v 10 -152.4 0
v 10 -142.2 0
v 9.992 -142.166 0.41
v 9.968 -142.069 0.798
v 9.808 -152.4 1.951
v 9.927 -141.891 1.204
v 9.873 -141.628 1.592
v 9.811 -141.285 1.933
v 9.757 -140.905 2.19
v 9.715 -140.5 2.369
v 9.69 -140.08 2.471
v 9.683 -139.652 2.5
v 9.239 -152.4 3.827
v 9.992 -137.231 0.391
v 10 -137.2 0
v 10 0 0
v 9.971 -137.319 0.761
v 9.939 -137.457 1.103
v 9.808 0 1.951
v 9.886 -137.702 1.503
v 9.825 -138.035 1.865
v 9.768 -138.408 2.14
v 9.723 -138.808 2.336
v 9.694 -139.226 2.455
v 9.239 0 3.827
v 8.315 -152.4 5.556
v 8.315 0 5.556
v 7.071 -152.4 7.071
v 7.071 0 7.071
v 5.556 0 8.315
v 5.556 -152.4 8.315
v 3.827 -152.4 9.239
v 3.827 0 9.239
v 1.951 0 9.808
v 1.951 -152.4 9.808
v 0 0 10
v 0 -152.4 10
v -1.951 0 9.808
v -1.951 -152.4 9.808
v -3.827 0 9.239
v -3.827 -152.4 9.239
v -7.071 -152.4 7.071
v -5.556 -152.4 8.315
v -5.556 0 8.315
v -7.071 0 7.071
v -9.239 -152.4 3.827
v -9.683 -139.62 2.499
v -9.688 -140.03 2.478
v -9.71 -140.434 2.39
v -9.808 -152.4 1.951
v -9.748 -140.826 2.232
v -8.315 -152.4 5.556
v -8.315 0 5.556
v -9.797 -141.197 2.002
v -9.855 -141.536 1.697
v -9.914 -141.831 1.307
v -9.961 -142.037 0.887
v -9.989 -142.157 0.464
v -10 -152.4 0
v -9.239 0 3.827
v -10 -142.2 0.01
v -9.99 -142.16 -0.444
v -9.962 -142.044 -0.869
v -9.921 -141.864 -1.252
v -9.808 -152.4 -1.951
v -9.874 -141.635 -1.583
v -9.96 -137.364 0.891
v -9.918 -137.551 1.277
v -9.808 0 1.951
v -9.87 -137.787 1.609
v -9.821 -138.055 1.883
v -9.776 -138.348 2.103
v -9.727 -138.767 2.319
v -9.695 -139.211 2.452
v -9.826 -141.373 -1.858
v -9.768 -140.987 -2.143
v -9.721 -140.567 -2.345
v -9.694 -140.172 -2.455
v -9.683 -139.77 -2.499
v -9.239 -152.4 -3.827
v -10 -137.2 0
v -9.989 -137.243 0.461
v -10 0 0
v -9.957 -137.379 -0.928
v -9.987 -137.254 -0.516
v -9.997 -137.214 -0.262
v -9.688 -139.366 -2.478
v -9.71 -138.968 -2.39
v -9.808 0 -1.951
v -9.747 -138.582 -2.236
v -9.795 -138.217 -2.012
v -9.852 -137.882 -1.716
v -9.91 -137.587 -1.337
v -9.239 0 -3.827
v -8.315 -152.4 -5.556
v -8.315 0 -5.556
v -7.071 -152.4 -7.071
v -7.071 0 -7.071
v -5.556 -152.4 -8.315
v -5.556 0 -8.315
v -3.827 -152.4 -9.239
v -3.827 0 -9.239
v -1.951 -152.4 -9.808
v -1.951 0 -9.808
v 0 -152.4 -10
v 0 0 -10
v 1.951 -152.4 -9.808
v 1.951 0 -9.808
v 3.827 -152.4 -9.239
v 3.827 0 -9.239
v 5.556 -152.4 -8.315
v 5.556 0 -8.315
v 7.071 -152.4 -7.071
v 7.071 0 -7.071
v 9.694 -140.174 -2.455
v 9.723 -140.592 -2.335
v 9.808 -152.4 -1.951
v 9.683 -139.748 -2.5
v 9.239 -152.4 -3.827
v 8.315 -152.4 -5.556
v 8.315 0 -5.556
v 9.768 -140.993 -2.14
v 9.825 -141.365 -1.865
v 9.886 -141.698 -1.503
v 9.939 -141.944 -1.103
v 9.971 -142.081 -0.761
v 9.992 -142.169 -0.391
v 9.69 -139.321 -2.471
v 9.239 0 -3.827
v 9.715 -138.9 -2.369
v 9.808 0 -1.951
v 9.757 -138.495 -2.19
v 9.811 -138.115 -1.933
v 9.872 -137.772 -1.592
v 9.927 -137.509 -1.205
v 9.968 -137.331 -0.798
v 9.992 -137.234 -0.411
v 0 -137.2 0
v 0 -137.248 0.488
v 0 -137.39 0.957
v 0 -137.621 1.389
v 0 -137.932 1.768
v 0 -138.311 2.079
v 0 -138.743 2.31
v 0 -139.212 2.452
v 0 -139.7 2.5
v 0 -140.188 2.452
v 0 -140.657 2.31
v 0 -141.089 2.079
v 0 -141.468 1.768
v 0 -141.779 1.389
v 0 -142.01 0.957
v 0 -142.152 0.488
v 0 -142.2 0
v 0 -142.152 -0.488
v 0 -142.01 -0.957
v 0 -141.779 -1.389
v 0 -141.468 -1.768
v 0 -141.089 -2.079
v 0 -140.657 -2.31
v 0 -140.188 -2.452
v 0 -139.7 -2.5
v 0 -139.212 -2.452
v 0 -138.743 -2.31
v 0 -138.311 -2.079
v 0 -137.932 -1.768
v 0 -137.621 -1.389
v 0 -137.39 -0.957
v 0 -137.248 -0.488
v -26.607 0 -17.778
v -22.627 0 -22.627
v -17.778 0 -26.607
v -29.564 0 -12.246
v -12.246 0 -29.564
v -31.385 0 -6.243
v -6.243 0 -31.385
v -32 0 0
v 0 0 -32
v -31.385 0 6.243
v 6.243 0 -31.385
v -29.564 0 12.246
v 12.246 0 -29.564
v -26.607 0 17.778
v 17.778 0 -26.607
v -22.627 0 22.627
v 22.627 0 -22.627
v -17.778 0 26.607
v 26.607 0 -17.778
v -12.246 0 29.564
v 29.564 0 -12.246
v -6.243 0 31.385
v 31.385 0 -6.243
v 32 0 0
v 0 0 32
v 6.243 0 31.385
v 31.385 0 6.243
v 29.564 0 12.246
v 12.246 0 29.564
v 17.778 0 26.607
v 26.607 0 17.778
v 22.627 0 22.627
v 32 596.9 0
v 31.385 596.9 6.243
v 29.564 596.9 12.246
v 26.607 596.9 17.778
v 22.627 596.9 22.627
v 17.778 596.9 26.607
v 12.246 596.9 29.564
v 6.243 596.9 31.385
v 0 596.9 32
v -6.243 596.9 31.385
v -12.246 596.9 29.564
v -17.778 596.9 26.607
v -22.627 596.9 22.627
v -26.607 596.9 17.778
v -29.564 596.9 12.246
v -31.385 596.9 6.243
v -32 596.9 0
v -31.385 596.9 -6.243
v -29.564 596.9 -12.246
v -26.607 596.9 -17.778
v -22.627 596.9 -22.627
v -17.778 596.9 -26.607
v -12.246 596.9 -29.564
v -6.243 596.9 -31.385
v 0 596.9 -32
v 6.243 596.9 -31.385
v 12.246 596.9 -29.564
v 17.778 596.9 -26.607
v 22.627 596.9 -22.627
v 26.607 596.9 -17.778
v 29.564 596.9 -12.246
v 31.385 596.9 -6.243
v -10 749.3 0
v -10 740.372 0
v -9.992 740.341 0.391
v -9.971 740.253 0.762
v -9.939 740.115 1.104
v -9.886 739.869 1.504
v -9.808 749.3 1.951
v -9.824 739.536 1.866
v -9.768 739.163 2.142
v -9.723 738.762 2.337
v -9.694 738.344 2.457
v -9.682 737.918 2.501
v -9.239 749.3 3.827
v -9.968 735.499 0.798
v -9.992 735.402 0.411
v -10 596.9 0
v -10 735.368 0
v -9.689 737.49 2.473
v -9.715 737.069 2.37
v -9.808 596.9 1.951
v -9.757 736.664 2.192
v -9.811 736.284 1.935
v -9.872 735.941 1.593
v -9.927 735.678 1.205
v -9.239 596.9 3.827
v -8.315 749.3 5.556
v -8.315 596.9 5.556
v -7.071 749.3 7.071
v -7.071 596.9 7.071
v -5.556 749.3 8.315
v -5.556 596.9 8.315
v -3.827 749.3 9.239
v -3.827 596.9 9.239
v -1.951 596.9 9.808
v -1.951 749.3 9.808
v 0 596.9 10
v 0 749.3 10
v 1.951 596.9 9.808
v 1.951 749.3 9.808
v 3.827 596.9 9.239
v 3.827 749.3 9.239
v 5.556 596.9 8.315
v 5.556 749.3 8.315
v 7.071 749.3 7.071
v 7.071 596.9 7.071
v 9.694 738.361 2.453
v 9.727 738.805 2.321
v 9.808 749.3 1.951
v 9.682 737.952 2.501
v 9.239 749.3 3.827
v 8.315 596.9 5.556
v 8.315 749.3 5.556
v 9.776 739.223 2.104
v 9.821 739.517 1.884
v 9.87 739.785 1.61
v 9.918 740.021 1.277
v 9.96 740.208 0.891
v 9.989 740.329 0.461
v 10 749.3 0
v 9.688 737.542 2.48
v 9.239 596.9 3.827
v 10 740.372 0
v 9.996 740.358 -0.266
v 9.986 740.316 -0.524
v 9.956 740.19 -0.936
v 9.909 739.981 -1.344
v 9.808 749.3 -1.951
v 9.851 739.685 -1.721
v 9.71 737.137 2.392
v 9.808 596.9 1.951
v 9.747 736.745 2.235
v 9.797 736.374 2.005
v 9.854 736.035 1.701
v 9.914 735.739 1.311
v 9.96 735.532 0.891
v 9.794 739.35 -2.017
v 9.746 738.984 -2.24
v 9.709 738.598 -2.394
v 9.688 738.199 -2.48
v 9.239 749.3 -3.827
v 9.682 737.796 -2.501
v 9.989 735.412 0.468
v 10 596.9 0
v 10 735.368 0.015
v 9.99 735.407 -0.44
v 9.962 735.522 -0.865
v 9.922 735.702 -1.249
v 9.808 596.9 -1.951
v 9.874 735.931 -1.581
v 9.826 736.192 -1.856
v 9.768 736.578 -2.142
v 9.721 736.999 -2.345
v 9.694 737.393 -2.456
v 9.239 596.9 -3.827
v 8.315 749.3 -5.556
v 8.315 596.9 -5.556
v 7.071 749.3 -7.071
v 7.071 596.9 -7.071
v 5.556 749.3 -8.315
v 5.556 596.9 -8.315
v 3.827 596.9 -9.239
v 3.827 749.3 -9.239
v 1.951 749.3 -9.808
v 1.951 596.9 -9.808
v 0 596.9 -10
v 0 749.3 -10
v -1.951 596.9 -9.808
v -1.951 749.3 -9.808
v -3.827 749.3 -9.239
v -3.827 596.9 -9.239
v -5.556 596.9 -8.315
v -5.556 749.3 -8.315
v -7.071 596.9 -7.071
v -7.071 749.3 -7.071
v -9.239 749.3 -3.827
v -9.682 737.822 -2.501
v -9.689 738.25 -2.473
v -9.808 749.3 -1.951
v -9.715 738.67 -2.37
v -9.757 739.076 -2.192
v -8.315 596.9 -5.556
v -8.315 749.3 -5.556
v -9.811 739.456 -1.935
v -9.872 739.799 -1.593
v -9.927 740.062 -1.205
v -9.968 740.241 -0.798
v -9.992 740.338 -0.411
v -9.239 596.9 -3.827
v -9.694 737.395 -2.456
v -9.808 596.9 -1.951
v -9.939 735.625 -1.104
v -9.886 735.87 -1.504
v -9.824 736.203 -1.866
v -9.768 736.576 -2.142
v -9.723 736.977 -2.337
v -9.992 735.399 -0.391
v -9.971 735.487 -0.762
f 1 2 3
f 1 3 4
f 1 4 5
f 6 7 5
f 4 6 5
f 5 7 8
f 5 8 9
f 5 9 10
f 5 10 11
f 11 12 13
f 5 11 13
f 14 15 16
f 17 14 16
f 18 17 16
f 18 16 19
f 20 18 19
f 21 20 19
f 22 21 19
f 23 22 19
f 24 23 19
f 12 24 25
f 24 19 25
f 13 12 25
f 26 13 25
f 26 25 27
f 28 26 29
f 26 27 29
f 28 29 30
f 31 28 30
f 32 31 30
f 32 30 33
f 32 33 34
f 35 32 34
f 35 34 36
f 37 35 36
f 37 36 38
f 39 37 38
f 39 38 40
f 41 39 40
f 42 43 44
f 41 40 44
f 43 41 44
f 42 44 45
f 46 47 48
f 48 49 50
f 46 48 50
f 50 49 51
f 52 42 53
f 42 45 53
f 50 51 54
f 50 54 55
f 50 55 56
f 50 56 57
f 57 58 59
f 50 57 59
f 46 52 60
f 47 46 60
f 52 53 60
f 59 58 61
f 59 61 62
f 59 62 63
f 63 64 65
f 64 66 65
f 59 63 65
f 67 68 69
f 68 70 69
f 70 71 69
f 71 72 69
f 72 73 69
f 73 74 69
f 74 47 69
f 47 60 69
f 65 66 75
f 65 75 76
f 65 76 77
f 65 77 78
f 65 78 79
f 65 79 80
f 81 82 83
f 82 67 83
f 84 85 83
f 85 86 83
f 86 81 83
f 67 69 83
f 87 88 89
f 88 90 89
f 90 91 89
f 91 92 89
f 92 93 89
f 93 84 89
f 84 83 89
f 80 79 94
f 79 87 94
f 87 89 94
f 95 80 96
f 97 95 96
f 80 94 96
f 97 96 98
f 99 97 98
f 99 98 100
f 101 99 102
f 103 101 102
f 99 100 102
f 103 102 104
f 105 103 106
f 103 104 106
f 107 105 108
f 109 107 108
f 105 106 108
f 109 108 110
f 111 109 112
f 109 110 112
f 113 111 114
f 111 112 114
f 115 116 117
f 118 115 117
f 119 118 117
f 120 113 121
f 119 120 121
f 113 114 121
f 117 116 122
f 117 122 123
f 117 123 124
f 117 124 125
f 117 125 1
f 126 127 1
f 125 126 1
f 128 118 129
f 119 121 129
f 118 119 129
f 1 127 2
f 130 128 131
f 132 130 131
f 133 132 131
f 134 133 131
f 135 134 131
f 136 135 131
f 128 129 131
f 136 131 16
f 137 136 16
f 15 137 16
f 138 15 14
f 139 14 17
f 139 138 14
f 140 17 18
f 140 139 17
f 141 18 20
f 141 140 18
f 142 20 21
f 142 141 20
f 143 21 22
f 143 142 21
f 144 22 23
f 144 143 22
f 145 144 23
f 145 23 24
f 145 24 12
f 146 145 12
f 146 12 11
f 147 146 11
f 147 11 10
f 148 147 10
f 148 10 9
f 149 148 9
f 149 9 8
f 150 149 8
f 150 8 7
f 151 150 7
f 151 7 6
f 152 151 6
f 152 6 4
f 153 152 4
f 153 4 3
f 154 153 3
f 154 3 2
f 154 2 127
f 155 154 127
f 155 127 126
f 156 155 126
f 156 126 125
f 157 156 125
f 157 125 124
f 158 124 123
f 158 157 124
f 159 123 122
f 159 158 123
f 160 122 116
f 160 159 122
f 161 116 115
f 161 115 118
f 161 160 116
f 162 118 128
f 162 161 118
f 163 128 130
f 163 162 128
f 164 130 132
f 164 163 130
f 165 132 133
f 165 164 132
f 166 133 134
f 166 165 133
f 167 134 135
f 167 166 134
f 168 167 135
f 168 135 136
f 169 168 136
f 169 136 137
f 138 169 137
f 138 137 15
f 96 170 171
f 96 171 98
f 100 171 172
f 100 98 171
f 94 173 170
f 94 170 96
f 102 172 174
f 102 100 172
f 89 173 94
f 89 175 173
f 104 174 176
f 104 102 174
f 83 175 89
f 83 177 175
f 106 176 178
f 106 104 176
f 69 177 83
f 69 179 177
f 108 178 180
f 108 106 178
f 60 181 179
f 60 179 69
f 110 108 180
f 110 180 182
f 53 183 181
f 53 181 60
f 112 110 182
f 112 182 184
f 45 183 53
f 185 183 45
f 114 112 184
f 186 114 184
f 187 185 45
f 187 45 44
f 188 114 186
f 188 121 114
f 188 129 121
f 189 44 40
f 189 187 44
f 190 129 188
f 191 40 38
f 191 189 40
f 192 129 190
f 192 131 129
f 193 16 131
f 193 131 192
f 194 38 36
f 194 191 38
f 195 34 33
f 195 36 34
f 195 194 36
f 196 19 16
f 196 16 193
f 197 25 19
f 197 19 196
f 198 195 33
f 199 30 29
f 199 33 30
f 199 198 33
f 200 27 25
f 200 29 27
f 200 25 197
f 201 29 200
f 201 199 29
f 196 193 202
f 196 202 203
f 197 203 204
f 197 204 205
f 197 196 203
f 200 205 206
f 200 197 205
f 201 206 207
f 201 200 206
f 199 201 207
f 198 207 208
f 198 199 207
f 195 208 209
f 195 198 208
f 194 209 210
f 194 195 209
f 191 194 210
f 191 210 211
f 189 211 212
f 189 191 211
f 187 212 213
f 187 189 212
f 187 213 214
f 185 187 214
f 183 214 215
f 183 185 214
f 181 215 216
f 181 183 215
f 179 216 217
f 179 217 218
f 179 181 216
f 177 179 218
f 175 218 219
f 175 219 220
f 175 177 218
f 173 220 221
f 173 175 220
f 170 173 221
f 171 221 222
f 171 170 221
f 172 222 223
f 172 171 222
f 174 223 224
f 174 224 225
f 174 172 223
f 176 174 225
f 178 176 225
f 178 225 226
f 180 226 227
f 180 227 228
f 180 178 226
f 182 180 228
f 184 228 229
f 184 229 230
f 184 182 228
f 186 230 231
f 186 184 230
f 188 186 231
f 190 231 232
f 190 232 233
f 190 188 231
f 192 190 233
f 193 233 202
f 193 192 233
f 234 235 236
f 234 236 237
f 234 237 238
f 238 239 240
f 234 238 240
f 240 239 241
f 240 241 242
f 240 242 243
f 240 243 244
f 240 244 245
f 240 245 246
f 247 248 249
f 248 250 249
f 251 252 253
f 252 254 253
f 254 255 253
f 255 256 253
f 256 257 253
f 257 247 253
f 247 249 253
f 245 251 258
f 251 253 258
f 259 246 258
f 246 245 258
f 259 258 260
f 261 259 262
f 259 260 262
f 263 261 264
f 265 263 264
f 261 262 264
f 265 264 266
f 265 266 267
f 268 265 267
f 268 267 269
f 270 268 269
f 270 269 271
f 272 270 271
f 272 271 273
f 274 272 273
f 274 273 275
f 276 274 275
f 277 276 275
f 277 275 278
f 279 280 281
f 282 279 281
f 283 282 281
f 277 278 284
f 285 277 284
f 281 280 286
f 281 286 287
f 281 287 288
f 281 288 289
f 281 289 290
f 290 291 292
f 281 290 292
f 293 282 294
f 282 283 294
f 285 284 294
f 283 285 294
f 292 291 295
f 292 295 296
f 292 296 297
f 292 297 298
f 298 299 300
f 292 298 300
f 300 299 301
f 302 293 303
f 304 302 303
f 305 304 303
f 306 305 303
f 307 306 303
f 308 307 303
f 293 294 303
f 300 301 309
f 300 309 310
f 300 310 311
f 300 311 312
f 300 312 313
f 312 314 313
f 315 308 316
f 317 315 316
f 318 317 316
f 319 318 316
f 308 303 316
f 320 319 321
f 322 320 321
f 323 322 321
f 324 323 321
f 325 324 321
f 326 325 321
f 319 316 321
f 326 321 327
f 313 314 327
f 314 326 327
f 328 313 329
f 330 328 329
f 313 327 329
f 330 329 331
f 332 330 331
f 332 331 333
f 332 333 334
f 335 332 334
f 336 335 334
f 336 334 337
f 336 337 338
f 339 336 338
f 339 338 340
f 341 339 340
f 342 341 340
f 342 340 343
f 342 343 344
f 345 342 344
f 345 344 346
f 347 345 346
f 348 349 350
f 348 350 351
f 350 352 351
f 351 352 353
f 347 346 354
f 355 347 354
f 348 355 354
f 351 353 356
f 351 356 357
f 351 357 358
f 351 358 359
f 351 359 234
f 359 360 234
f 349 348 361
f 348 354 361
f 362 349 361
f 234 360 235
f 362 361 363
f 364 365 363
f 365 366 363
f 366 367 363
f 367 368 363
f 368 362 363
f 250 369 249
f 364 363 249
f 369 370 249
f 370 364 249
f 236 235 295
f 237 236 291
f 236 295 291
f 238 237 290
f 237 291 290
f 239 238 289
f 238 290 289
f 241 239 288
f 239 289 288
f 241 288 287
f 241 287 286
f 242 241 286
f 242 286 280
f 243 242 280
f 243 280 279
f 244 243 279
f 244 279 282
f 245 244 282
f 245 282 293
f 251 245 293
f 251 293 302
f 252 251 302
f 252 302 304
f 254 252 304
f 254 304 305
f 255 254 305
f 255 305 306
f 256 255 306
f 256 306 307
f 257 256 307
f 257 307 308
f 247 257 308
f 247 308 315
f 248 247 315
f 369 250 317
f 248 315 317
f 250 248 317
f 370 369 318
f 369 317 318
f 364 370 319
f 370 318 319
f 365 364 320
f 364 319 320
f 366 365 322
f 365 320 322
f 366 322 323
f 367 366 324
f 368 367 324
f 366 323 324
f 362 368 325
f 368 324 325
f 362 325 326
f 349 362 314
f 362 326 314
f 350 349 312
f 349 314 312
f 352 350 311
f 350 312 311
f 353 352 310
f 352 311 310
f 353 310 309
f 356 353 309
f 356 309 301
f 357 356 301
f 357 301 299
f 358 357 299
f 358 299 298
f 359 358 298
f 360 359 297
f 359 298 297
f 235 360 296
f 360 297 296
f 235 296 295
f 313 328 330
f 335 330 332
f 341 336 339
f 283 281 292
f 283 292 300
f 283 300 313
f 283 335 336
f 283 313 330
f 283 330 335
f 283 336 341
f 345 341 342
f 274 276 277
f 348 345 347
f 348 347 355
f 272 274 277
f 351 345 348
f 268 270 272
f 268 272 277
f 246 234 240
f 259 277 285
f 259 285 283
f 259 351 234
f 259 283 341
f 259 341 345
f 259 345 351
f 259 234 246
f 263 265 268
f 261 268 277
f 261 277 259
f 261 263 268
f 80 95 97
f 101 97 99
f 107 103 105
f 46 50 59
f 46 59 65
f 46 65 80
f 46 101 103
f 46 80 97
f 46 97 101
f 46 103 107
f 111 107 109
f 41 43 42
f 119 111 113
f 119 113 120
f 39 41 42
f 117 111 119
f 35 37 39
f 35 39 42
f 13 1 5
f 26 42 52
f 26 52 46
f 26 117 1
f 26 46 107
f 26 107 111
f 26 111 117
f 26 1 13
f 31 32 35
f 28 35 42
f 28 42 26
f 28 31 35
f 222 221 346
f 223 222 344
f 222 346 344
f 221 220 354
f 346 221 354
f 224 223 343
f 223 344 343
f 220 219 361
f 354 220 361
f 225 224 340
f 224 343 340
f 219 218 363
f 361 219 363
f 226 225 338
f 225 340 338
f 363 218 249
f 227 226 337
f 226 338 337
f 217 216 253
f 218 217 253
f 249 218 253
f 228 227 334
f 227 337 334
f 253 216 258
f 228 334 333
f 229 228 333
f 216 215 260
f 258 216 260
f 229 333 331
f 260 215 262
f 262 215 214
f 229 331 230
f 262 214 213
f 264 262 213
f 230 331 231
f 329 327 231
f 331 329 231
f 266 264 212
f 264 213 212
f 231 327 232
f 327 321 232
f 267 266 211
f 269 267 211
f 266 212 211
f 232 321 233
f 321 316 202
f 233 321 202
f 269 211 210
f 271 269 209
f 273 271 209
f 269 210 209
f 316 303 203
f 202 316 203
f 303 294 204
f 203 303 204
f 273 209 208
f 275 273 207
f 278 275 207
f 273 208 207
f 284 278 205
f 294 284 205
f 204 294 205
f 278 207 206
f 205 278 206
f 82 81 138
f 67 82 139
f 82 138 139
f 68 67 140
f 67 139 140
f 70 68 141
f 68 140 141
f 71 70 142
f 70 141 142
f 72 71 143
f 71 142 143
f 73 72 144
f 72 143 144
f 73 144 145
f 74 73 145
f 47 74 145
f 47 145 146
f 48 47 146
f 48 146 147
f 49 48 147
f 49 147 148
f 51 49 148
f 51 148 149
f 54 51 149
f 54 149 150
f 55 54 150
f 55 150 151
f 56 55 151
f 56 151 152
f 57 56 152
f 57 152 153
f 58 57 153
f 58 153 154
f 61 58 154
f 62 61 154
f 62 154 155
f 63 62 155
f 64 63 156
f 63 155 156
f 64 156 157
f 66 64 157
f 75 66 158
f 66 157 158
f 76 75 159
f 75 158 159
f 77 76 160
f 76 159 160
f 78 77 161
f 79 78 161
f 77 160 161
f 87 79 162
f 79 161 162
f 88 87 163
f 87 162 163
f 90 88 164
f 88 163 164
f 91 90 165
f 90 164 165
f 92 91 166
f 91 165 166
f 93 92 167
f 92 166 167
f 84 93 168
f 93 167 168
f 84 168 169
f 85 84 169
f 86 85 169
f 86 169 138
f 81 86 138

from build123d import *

# Parameters (mm, degrees)
F0_R     = 32
F0_R_2   = 10
F1_DEPTH = 596.9
F2_DEPTH = 152.4
F3_R     = 10
F4_DEPTH = 152.4
F5_R     = 2.5
F5_R_2   = 2.5019
F6_DEPTH = 63.5


# Not quite as in the source:
# - a feature names something its author has since deleted; it is built from what else it names


with BuildPart() as f1:
    # F0 (on Front) → F1 (new body)
    with BuildSketch(Plane.XZ):
        Circle(F0_R)
        Circle(F0_R_2, mode=Mode.SUBTRACT)
        Circle(F0_R_2)
    extrude(amount=-F1_DEPTH)

    # F0 (on Front) → F2 (join)
    with BuildSketch(Plane.XZ):
        Circle(F0_R_2)
    extrude(amount=F2_DEPTH)

    # F3 (on face) → F4 (join)
    with BuildSketch(Plane(origin=(0, 596.9, 0), x_dir=(-1, 0, 0), z_dir=(0, 1, 0))):
        Circle(F3_R)
    extrude(amount=F4_DEPTH)

    # F5 (on Right) → F6 (cut, symmetric)
    with BuildSketch(Plane.YZ):
        with Locations((-139.7, 0)):
            Circle(F5_R)
        with Locations((737.87, 0)):
            Circle(F5_R_2)
    extrude(amount=F6_DEPTH, both=True, mode=Mode.SUBTRACT)


solid = f1.part
